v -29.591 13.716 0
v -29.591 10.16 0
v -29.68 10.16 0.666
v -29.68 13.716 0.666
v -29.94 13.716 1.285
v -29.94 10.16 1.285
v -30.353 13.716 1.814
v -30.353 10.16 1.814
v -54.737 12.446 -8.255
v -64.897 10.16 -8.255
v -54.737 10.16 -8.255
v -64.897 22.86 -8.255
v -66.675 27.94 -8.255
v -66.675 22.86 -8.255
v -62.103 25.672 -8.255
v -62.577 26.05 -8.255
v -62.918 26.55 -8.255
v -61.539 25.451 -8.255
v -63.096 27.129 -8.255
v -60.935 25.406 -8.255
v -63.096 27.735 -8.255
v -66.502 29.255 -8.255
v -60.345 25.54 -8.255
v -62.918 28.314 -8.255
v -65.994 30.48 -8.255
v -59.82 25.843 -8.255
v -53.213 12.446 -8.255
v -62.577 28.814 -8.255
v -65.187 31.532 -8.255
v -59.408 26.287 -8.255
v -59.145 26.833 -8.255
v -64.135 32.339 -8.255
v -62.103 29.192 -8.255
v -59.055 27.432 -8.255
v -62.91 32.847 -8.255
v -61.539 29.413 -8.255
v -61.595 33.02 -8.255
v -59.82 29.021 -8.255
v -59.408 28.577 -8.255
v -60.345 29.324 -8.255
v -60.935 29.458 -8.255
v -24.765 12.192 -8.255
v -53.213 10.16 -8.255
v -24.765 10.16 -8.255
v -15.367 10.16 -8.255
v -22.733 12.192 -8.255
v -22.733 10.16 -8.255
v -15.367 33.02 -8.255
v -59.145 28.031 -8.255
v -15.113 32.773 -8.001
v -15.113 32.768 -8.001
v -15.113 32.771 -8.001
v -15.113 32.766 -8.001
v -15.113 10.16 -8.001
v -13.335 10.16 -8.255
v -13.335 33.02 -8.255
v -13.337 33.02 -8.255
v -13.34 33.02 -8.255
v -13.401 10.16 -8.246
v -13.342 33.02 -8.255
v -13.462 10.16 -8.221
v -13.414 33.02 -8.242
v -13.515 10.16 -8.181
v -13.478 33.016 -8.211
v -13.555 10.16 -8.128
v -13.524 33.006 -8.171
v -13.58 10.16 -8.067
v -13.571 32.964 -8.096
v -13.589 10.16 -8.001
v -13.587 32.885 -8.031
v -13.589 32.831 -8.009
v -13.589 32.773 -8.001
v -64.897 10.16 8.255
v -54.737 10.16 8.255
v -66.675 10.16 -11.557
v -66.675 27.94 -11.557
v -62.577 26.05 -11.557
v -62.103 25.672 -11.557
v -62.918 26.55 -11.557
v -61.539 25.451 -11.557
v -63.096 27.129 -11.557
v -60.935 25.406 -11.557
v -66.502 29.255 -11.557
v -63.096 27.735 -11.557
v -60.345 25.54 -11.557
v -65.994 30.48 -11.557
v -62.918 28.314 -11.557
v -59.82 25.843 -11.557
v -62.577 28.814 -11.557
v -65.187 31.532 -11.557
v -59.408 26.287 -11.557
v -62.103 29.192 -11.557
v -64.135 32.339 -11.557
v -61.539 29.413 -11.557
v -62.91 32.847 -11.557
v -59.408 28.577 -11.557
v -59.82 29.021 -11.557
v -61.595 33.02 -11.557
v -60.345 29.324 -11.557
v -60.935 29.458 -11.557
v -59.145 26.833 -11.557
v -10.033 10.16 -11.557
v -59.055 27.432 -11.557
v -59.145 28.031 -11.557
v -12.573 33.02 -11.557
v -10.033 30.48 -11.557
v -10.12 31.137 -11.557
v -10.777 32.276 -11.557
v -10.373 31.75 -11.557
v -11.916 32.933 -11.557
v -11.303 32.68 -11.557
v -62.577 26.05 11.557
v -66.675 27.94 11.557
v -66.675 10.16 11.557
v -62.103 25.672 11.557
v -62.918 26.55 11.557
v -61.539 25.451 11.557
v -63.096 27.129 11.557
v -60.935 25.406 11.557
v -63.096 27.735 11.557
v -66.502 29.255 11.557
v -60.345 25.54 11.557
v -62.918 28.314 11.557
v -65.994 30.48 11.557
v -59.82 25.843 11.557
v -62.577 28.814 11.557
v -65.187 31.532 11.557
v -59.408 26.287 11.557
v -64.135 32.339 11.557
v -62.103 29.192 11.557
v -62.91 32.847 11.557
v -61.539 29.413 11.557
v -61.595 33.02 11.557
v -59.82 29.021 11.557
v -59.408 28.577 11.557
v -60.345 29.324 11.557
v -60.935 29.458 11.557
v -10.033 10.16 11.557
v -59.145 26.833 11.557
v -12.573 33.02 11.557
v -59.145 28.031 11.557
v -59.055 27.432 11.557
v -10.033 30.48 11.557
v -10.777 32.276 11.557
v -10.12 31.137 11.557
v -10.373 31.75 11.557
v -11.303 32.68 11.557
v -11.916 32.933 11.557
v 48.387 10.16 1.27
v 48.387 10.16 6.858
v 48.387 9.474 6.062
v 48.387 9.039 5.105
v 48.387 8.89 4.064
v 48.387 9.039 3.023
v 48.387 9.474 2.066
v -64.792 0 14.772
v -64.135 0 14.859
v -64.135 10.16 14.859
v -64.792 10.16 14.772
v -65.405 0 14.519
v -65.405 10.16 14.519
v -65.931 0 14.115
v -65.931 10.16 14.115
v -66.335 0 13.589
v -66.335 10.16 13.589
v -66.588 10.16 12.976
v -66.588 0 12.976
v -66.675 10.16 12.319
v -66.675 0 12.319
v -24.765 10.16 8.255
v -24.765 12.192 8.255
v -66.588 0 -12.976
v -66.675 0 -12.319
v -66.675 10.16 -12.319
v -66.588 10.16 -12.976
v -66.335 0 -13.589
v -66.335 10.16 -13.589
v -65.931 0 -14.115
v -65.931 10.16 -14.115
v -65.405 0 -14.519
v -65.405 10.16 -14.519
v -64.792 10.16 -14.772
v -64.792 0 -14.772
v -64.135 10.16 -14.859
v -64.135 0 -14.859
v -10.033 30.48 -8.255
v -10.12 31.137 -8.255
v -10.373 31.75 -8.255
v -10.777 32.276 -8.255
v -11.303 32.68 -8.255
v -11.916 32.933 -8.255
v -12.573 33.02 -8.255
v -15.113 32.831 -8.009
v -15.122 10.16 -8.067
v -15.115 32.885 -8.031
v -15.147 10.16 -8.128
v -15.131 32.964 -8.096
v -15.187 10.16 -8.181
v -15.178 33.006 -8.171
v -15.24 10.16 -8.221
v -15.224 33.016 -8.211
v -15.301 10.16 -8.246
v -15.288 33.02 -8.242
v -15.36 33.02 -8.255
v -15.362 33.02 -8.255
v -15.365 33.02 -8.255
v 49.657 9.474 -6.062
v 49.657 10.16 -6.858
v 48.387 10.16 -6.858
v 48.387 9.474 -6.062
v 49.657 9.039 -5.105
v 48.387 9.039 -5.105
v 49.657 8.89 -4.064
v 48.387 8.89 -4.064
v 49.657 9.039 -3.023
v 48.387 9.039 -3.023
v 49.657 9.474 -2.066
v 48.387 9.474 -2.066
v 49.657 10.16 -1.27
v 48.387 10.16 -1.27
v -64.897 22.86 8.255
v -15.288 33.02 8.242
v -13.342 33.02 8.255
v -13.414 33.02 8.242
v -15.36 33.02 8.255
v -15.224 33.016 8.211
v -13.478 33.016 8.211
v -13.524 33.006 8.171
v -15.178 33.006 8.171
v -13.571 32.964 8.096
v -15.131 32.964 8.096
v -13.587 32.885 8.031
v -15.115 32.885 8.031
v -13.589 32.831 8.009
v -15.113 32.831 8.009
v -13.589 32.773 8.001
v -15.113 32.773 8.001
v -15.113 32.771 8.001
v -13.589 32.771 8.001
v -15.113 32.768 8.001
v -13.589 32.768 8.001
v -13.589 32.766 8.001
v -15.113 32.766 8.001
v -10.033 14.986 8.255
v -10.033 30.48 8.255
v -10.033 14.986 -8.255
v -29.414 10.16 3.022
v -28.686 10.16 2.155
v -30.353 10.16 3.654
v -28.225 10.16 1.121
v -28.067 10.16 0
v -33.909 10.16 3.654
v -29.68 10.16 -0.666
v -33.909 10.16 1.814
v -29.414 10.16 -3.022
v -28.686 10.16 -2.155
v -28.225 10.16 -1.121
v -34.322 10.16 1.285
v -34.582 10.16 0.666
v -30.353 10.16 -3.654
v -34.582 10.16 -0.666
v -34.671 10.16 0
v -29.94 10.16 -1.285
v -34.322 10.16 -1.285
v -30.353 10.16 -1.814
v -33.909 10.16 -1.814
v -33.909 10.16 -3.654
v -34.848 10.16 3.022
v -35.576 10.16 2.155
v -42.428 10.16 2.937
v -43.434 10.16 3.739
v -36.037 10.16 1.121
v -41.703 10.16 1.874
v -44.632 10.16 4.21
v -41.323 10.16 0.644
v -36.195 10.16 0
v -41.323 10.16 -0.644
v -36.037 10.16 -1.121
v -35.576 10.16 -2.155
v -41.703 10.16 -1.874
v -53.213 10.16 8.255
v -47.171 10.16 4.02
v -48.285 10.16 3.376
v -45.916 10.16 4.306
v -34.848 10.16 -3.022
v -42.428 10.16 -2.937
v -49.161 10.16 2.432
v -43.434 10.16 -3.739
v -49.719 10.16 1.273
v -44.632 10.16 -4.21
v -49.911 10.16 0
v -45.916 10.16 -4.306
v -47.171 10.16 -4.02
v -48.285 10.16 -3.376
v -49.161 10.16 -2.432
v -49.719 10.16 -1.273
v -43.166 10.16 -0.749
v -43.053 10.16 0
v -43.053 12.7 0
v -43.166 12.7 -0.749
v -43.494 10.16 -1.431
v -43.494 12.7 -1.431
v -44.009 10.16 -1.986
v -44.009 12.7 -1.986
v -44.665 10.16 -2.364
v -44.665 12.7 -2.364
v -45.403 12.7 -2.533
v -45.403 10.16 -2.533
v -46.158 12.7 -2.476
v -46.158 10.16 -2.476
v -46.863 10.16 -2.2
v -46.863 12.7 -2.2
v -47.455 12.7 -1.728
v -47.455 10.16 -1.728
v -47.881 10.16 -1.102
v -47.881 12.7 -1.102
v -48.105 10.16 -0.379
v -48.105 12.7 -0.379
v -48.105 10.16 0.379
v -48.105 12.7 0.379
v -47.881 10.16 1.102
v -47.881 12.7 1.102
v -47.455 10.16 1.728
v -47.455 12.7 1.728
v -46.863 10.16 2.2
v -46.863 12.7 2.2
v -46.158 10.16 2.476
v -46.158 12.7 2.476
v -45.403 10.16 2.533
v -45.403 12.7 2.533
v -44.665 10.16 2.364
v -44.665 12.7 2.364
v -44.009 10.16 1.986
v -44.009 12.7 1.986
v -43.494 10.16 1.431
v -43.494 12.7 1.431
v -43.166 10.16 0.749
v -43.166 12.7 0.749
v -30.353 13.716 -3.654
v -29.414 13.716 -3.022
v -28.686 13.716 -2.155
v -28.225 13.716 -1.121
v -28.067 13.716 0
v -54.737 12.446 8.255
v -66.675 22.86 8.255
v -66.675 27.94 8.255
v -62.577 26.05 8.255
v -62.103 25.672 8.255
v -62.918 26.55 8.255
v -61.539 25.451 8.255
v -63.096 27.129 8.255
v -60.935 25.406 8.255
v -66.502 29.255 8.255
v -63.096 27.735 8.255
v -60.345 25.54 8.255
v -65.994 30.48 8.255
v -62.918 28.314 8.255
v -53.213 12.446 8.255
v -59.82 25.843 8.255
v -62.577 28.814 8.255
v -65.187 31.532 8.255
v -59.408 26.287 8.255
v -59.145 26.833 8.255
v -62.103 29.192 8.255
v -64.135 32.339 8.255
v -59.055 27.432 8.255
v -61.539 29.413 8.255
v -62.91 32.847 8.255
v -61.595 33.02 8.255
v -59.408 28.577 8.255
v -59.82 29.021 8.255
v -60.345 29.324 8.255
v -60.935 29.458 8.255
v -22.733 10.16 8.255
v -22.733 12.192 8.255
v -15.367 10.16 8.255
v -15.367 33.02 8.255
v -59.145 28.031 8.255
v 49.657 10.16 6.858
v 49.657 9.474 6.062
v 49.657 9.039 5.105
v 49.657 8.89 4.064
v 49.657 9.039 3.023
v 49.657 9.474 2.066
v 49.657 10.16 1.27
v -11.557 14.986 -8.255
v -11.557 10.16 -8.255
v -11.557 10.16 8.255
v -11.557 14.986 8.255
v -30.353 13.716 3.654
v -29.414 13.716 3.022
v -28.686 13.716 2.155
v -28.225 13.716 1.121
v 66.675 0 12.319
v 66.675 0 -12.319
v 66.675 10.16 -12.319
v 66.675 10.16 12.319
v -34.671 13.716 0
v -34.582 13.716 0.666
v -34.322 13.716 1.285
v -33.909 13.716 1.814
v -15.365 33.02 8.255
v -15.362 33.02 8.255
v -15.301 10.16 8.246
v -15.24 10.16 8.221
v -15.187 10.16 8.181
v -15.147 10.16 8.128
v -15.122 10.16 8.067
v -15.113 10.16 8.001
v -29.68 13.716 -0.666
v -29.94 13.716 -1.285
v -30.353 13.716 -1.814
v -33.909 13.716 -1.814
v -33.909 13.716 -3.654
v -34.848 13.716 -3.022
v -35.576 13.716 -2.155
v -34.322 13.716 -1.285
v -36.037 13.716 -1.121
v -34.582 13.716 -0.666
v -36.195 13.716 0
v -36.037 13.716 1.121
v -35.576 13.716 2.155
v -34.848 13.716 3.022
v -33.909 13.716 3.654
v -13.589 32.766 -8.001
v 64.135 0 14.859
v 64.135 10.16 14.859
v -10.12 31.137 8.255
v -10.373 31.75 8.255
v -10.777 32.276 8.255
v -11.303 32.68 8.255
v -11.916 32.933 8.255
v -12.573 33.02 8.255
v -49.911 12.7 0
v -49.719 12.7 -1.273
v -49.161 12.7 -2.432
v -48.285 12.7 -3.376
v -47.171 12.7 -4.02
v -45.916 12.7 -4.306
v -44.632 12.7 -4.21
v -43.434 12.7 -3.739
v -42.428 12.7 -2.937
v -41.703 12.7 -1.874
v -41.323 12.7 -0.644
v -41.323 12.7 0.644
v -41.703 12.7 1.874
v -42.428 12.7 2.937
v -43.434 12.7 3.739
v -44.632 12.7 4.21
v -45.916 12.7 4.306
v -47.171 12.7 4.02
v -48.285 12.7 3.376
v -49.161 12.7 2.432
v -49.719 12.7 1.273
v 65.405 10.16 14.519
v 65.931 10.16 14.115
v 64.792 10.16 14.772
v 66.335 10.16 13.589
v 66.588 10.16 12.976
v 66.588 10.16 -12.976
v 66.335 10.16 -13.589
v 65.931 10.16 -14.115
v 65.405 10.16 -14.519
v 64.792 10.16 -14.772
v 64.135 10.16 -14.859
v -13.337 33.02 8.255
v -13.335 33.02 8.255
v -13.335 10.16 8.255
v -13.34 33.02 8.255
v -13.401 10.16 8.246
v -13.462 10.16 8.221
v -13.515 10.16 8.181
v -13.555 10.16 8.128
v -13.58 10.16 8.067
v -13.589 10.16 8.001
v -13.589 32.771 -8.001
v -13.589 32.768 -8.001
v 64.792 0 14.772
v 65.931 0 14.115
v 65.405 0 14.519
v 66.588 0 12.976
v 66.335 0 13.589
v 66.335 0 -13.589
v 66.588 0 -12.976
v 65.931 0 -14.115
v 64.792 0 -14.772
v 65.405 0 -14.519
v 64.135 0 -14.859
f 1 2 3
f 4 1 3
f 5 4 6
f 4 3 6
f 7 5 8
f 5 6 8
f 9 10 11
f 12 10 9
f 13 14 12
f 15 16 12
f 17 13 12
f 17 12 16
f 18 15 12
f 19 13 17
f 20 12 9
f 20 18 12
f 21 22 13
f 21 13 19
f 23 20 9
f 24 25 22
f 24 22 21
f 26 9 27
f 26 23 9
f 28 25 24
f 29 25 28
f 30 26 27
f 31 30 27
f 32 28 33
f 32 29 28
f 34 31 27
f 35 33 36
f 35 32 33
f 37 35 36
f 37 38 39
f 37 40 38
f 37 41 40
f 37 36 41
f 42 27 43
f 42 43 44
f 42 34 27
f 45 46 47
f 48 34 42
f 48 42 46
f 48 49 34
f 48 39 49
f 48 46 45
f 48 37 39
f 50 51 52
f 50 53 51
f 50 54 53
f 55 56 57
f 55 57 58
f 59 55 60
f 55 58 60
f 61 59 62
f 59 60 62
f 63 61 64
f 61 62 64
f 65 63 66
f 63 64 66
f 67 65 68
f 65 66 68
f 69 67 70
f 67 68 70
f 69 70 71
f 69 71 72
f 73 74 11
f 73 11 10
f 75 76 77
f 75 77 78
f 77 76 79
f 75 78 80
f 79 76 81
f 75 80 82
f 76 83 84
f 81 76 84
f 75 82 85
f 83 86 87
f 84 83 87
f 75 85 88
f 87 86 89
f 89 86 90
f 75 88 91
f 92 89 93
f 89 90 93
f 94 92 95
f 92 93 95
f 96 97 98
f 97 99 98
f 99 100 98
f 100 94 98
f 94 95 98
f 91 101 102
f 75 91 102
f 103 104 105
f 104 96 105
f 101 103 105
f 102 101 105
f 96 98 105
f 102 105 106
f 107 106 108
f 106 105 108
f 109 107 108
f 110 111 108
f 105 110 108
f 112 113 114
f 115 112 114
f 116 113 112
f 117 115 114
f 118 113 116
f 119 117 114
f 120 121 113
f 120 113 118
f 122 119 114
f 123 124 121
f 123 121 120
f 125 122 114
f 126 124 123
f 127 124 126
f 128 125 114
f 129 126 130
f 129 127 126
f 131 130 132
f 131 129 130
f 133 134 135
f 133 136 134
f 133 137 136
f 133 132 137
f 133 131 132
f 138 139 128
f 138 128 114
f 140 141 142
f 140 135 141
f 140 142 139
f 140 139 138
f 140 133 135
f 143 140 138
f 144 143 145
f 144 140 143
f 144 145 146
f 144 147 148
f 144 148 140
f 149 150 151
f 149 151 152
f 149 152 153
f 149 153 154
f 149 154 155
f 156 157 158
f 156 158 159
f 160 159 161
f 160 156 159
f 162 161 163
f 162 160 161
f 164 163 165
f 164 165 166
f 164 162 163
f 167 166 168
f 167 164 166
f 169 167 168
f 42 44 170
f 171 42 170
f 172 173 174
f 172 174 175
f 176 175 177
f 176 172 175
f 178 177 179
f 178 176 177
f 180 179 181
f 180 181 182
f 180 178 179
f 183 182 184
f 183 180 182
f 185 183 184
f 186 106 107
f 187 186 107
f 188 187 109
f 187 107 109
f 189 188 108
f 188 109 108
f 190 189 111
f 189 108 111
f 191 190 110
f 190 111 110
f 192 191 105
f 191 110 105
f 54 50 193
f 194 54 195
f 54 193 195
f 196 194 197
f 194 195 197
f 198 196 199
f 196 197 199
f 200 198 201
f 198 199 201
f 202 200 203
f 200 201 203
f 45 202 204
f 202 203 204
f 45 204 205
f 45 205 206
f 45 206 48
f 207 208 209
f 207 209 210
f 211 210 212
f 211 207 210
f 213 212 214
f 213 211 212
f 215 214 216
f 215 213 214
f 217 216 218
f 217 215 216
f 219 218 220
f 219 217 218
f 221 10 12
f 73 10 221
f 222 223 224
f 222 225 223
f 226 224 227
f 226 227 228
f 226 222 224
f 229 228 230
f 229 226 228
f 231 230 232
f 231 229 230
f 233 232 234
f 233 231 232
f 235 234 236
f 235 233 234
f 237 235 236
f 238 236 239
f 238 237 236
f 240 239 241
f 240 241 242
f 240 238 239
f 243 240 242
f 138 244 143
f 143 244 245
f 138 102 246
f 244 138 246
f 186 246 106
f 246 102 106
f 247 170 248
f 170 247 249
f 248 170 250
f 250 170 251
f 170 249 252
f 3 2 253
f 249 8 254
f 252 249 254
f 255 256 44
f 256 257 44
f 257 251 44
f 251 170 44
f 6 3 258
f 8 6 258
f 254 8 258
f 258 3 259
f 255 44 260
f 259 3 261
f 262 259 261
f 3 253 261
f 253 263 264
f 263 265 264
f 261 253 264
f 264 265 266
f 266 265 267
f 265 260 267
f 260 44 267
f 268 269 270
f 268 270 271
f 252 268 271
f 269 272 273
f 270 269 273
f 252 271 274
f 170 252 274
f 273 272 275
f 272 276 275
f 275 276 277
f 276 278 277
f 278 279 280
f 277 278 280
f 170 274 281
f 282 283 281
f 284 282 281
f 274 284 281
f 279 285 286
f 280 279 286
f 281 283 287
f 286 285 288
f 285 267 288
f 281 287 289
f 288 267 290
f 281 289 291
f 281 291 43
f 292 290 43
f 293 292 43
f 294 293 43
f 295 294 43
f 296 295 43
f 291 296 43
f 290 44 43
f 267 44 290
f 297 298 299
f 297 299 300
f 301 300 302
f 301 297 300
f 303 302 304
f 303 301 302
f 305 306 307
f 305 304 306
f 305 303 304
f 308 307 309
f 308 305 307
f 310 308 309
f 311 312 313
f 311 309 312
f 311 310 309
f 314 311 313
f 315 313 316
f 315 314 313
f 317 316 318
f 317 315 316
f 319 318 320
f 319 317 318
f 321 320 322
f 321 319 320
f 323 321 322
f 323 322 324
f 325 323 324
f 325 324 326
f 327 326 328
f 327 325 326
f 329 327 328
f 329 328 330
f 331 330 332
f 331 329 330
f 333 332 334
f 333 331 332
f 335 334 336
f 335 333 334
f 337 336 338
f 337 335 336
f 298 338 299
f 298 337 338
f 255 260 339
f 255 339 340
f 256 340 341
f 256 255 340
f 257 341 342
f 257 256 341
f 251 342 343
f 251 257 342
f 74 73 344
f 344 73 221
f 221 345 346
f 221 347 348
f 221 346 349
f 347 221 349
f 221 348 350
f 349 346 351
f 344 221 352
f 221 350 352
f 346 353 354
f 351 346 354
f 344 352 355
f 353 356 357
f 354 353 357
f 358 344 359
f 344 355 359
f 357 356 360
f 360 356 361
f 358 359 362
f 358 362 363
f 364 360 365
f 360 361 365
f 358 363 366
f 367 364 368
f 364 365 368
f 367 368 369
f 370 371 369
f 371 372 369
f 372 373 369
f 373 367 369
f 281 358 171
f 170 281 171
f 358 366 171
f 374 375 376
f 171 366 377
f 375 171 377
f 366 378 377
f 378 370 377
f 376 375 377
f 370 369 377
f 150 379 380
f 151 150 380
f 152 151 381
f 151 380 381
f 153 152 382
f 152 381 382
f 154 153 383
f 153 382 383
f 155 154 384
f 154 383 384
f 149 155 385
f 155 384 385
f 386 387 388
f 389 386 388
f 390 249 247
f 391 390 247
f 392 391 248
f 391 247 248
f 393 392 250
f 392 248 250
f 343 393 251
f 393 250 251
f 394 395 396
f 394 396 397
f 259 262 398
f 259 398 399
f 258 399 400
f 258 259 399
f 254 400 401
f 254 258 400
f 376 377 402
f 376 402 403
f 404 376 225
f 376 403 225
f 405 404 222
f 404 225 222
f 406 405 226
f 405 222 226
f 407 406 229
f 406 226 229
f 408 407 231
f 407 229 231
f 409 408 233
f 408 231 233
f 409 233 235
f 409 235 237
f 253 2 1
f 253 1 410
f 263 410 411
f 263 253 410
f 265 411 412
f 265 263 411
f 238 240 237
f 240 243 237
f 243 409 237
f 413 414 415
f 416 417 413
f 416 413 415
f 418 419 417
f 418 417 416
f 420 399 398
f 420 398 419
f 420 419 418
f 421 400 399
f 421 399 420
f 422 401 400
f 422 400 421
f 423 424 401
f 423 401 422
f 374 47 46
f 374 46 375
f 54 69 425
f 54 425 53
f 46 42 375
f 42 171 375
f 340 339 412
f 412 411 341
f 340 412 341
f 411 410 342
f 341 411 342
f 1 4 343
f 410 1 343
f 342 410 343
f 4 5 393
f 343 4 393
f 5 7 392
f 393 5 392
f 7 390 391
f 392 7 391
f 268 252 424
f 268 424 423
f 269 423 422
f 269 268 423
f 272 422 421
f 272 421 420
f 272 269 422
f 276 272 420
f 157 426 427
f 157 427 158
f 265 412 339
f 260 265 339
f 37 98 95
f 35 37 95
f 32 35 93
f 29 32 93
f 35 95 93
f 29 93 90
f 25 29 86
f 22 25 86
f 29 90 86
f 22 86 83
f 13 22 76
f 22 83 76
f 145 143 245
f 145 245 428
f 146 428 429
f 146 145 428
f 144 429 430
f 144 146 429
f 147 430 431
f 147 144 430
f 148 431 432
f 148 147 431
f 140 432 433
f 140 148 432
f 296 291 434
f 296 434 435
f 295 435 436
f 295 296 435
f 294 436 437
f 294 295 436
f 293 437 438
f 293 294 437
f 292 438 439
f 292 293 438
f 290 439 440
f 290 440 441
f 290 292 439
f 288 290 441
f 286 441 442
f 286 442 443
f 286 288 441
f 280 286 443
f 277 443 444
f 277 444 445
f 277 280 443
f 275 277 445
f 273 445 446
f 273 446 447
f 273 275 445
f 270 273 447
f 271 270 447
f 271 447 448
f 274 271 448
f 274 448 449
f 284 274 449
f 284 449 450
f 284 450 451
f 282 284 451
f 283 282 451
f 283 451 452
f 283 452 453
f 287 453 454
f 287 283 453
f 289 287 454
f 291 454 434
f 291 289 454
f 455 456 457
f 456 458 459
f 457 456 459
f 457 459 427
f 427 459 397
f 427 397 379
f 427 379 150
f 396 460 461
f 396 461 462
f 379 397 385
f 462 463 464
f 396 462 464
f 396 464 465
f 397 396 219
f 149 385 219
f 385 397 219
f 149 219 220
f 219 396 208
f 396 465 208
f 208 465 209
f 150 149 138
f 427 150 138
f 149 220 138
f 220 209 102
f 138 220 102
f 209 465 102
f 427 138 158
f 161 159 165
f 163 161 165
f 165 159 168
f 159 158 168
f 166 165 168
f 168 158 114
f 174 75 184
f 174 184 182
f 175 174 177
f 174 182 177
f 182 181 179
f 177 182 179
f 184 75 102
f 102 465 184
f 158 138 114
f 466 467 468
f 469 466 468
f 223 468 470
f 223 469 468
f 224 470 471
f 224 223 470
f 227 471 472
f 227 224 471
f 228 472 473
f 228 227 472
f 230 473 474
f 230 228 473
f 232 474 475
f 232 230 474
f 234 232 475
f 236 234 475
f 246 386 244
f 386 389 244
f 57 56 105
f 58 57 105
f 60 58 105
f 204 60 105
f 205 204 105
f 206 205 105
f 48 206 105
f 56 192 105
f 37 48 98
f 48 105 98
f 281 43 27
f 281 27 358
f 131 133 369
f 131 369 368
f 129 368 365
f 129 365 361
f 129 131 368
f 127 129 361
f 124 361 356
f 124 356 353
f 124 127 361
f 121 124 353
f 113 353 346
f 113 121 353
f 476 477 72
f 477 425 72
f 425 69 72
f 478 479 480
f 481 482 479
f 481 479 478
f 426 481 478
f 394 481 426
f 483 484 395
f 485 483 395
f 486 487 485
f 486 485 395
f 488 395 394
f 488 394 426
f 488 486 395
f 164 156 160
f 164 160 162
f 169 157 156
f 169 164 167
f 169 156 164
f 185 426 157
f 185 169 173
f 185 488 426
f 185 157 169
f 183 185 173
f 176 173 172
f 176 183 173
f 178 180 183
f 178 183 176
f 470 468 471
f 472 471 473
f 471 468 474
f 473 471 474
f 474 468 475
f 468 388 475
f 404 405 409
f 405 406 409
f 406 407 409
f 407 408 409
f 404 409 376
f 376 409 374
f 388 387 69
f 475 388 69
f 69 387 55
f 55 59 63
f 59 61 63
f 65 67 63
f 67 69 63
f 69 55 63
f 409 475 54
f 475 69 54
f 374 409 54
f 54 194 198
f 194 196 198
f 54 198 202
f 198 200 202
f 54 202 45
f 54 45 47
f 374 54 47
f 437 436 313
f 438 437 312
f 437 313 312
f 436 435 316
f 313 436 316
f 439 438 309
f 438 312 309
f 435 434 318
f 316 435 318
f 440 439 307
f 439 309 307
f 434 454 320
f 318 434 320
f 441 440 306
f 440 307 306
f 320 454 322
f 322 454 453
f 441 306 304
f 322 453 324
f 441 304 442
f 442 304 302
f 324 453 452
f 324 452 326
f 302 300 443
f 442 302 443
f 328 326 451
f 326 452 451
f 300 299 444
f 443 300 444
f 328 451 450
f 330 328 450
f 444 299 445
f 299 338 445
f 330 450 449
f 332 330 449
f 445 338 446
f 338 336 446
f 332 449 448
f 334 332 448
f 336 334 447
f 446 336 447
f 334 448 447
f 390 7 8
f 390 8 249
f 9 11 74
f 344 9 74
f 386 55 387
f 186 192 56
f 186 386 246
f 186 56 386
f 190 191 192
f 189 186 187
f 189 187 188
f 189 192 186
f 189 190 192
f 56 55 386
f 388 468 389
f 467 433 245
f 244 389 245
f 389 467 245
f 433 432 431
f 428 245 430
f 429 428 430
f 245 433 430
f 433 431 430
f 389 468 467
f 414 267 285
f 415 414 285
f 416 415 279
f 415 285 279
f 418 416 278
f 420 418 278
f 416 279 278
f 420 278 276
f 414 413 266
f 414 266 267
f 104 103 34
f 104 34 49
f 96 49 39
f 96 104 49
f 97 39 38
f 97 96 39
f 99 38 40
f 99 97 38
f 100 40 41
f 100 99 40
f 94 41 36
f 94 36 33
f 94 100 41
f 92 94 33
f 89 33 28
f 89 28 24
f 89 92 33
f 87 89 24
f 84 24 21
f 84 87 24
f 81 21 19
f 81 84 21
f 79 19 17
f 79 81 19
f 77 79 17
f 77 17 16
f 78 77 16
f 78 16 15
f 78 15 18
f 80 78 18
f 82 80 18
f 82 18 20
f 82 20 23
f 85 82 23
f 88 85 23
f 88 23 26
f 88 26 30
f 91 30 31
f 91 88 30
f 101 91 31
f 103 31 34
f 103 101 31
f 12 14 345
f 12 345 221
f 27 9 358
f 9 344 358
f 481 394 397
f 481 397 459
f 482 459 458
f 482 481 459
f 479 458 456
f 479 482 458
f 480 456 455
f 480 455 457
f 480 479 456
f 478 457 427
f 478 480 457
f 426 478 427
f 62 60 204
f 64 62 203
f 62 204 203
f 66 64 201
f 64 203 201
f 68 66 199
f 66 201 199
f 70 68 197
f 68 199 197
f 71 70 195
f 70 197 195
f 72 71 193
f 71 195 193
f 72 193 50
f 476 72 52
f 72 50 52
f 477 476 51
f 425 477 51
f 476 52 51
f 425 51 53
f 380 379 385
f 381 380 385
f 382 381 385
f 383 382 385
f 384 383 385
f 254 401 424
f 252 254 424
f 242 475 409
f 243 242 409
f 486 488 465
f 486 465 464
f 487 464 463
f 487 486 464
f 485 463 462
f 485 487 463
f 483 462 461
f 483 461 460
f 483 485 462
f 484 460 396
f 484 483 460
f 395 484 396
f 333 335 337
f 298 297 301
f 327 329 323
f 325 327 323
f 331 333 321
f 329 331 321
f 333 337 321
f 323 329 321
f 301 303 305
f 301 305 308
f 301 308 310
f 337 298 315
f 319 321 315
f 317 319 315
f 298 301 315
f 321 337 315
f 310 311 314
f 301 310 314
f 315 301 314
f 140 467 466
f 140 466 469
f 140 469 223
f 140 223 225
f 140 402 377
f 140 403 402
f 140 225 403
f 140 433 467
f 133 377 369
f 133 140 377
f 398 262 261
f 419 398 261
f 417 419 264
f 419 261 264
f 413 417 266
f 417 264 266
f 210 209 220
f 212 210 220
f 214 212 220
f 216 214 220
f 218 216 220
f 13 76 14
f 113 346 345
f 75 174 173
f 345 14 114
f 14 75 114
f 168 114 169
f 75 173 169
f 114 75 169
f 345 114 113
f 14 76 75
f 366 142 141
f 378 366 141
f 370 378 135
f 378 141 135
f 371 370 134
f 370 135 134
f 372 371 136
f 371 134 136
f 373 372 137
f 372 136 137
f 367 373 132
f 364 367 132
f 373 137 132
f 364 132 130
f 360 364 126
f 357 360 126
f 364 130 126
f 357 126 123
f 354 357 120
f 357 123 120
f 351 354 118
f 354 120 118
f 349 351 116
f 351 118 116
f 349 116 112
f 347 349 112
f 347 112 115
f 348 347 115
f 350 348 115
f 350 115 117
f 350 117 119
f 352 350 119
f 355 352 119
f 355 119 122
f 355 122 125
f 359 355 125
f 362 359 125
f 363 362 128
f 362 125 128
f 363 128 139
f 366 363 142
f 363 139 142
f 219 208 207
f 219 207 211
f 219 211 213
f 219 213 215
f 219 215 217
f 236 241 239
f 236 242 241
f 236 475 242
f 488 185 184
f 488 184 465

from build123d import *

# Parameters (mm, degrees)
BOSS_EXTRUDE1_DEPTH  = 10.16
SKETCH2_R            = 2.032
BOSS_EXTRUDE2_DEPTH  = 3.302
SKETCH3_W            = 1.778
SKETCH3_H            = 8.255
BOSS_EXTRUDE3_DEPTH  = 12.7
SKETCH4_W            = 1.524
SKETCH4_H            = 8.255
BOSS_EXTRUDE4_DEPTH  = 2.286
BOSS_EXTRUDE5_DEPTH  = 2.54
BOSS_EXTRUDE6_DEPTH  = 3.556
SKETCH7_W            = 2.032
SKETCH7_H            = 8.255
BOSS_EXTRUDE7_DEPTH  = 2.032
SKETCH8_W            = 1.524
SKETCH8_H            = 8.255
BOSS_EXTRUDE8_DEPTH  = 4.826
SKETCH9_W            = 1.524
SKETCH9_H            = 22.86
BOSS_EXTRUDE9_DEPTH  = 0.254
FILLET2_R            = 0.254
FILLET4_R            = 0.254
FILLET2_OF_MIRROR1_R = 0.254
FILLET4_OF_MIRROR1_R = 0.254
SKETCH10_R           = 3.7084
CUT_EXTRUDE1_DEPTH   = 1.27


with BuildPart() as part:
    # Sketch1 → Boss-Extrude1 (new body)
    with BuildSketch(Plane(origin=(0, 0, 0), x_dir=(1, 0, 0), z_dir=(0, 1, 0))):
        with BuildLine():
            Line((-64.135, 14.859), (64.135, 14.859))
            ThreePointArc((64.135, 14.859), (65.931051224, 14.115051224), (66.675, 12.319))
            Line((66.675, 12.319), (66.675, -12.319))
            ThreePointArc((66.675, -12.319), (65.931051224, -14.115051224), (64.135, -14.859))
            Line((64.135, -14.859), (-64.135, -14.859))
            ThreePointArc((-64.135, -14.859), (-65.931051224, -14.115051224), (-66.675, -12.319))
            Line((-66.675, -12.319), (-66.675, 12.319))
            ThreePointArc((-66.675, 12.319), (-65.931051224, 14.115051224), (-64.135, 14.859))
        make_face()
    extrude(amount=BOSS_EXTRUDE1_DEPTH)

    # Sketch2 → Boss-Extrude2 (add)
    with BuildSketch(Plane.XY.offset(11.557)):
        with BuildLine():
            Line((-10.033, 10.16), (-10.033, 30.48))
            ThreePointArc((-10.033, 30.48), (-10.776948776, 32.276051224), (-12.573, 33.02))
            Line((-12.573, 33.02), (-61.595, 33.02))
            ThreePointArc((-61.595, 33.02), (-65.187102448, 31.532102448), (-66.675, 27.94))
            Line((-66.675, 27.94), (-66.675, 10.16))
            Line((-66.675, 10.16), (-10.033, 10.16))
        make_face()
        with Locations((-61.087, 27.432)):
            Circle(SKETCH2_R, mode=Mode.SUBTRACT)
    boss_extrude2 = extrude(amount=-BOSS_EXTRUDE2_DEPTH)

    # Sketch3 → Boss-Extrude3 (add)
    with BuildSketch(Plane(origin=(0, 10.16, 0), x_dir=(1, 0, 0), z_dir=(0, 1, 0))):
        with Locations((-65.786, -4.1275)):
            Rectangle(SKETCH3_W, SKETCH3_H)
    boss_extrude3 = extrude(amount=BOSS_EXTRUDE3_DEPTH)

    # Sketch4 → Boss-Extrude4 (add)
    with BuildSketch(Plane(origin=(0, 10.16, 0), x_dir=(1, 0, 0), z_dir=(0, 1, 0))):
        with Locations((-53.975, -4.1275)):
            Rectangle(SKETCH4_W, SKETCH4_H)
    boss_extrude4 = extrude(amount=BOSS_EXTRUDE4_DEPTH)

    # Sketch5 → Boss-Extrude5 (add)
    with BuildSketch(Plane(origin=(0, 10.16, 0), x_dir=(1, 0, 0), z_dir=(0, 1, 0))):
        with BuildLine():
            Line((-48.133, 0), (-49.911, 0))
            ThreePointArc((-49.911, 0), (-45.593, -4.318), (-41.275, 0))
            Line((-41.275, 0), (-43.053, 0))
            ThreePointArc((-43.053, 0), (-45.593, -2.54), (-48.133, 0))
        make_face()
    boss_extrude5 = extrude(amount=BOSS_EXTRUDE5_DEPTH)

    # Sketch6 → Boss-Extrude6 (add)
    with BuildSketch(Plane(origin=(0, 10.16, 0), x_dir=(1, 0, 0), z_dir=(0, 1, 0))):
        with BuildLine():
            Line((-33.909, -1.813922821), (-33.909, -3.654423621))
            ThreePointArc((-33.909, -3.654423621), (-35.576423631, -2.155261469), (-36.195, 0))
            Line((-36.195, 0), (-34.671, 0))
            ThreePointArc((-34.671, 0), (-34.472764292, -0.98373777), (-33.909, -1.813922821))
        make_face()
        with BuildLine():
            Line((-30.353, -1.813922821), (-30.353, -3.654423621))
            ThreePointArc((-30.353, -3.654423621), (-28.685576369, -2.155261469), (-28.067, 0))
            Line((-28.067, 0), (-29.591, 0))
            ThreePointArc((-29.591, 0), (-29.789235708, -0.98373777), (-30.353, -1.813922821))
        make_face()
    boss_extrude6 = extrude(amount=BOSS_EXTRUDE6_DEPTH)

    # Sketch7 → Boss-Extrude7 (add)
    with BuildSketch(Plane(origin=(0, 10.16, 0), x_dir=(1, 0, 0), z_dir=(0, 1, 0))):
        with Locations((-23.749, -4.1275)):
            Rectangle(SKETCH7_W, SKETCH7_H)
    boss_extrude7 = extrude(amount=BOSS_EXTRUDE7_DEPTH)

    # Sketch8 → Boss-Extrude8 (add)
    with BuildSketch(Plane(origin=(0, 10.16, 0), x_dir=(1, 0, 0), z_dir=(0, 1, 0))):
        with Locations((-10.795, -4.1275)):
            Rectangle(SKETCH8_W, SKETCH8_H)
    boss_extrude8 = extrude(amount=BOSS_EXTRUDE8_DEPTH)

    # Sketch9 → Boss-Extrude9 (add)
    with BuildSketch(Plane(origin=(0, 0, 8.255), x_dir=(-1, 0, 0), z_dir=(0, 0, -1))):
        with Locations((14.351, 21.59)):
            Rectangle(SKETCH9_W, SKETCH9_H)
    boss_extrude9 = extrude(amount=BOSS_EXTRUDE9_DEPTH)

    # Fillet2
    fillet2_edges = [part.edges().sort_by_distance(p)[0] for p in [
        (-13.589, 21.59, 8.255),
        (-15.113, 21.59, 8.255),
    ]]
    fillet(fillet2_edges, radius=FILLET2_R - 0.0001)  # a hair under: the kernel refuses the full size

    # Fillet4
    fillet4_edges = [part.edges().sort_by_distance(p)[0] for p in [
        (-14.351, 33.02, 8.001),
    ]]
    fillet(fillet4_edges, radius=FILLET4_R - 0.0001)  # a hair under: the kernel refuses the full size

    # Mirror1: Boss-Extrude2, Boss-Extrude3, Boss-Extrude4, Boss-Extrude5, Boss-Extrude6, Boss-Extrude7, Boss-Extrude8, Boss-Extrude9 across plane
    add(boss_extrude2.mirror(Plane.XY))
    add(boss_extrude3.mirror(Plane.XY))
    add(boss_extrude4.mirror(Plane.XY))
    add(boss_extrude5.mirror(Plane.XY))
    add(boss_extrude6.mirror(Plane.XY))
    add(boss_extrude7.mirror(Plane.XY))
    add(boss_extrude8.mirror(Plane.XY))
    add(boss_extrude9.mirror(Plane.XY))

    # Fillet2 of Mirror1
    fillet2_of_mirror1_edges = [part.edges().sort_by_distance(p)[0] for p in [
        (-13.589, 21.59, -8.255),
        (-15.113, 21.59, -8.255),
    ]]
    fillet(fillet2_of_mirror1_edges, radius=FILLET2_OF_MIRROR1_R - 0.0001)  # a hair under: the kernel refuses the full size

    # Fillet4 of Mirror1
    fillet4_of_mirror1_edges = [part.edges().sort_by_distance(p)[0] for p in [
        (-14.351, 33.02, -8.001),
    ]]
    fillet(fillet4_of_mirror1_edges, radius=FILLET4_OF_MIRROR1_R - 0.0001)  # a hair under: the kernel refuses the full size

    # Sketch10 → Cut-Extrude1 (cut)
    with BuildSketch(Plane(origin=(49.657, 0, 0), x_dir=(0, 0, -1), z_dir=(1, 0, 0))):
        with Locations((-4.064, 12.5984)):
            Circle(SKETCH10_R)
    cut_extrude1 = extrude(amount=-CUT_EXTRUDE1_DEPTH, mode=Mode.SUBTRACT)

    # Mirror2: Cut-Extrude1 across plane
    add(cut_extrude1.mirror(Plane.XY), mode=Mode.SUBTRACT)


solid = part.part
